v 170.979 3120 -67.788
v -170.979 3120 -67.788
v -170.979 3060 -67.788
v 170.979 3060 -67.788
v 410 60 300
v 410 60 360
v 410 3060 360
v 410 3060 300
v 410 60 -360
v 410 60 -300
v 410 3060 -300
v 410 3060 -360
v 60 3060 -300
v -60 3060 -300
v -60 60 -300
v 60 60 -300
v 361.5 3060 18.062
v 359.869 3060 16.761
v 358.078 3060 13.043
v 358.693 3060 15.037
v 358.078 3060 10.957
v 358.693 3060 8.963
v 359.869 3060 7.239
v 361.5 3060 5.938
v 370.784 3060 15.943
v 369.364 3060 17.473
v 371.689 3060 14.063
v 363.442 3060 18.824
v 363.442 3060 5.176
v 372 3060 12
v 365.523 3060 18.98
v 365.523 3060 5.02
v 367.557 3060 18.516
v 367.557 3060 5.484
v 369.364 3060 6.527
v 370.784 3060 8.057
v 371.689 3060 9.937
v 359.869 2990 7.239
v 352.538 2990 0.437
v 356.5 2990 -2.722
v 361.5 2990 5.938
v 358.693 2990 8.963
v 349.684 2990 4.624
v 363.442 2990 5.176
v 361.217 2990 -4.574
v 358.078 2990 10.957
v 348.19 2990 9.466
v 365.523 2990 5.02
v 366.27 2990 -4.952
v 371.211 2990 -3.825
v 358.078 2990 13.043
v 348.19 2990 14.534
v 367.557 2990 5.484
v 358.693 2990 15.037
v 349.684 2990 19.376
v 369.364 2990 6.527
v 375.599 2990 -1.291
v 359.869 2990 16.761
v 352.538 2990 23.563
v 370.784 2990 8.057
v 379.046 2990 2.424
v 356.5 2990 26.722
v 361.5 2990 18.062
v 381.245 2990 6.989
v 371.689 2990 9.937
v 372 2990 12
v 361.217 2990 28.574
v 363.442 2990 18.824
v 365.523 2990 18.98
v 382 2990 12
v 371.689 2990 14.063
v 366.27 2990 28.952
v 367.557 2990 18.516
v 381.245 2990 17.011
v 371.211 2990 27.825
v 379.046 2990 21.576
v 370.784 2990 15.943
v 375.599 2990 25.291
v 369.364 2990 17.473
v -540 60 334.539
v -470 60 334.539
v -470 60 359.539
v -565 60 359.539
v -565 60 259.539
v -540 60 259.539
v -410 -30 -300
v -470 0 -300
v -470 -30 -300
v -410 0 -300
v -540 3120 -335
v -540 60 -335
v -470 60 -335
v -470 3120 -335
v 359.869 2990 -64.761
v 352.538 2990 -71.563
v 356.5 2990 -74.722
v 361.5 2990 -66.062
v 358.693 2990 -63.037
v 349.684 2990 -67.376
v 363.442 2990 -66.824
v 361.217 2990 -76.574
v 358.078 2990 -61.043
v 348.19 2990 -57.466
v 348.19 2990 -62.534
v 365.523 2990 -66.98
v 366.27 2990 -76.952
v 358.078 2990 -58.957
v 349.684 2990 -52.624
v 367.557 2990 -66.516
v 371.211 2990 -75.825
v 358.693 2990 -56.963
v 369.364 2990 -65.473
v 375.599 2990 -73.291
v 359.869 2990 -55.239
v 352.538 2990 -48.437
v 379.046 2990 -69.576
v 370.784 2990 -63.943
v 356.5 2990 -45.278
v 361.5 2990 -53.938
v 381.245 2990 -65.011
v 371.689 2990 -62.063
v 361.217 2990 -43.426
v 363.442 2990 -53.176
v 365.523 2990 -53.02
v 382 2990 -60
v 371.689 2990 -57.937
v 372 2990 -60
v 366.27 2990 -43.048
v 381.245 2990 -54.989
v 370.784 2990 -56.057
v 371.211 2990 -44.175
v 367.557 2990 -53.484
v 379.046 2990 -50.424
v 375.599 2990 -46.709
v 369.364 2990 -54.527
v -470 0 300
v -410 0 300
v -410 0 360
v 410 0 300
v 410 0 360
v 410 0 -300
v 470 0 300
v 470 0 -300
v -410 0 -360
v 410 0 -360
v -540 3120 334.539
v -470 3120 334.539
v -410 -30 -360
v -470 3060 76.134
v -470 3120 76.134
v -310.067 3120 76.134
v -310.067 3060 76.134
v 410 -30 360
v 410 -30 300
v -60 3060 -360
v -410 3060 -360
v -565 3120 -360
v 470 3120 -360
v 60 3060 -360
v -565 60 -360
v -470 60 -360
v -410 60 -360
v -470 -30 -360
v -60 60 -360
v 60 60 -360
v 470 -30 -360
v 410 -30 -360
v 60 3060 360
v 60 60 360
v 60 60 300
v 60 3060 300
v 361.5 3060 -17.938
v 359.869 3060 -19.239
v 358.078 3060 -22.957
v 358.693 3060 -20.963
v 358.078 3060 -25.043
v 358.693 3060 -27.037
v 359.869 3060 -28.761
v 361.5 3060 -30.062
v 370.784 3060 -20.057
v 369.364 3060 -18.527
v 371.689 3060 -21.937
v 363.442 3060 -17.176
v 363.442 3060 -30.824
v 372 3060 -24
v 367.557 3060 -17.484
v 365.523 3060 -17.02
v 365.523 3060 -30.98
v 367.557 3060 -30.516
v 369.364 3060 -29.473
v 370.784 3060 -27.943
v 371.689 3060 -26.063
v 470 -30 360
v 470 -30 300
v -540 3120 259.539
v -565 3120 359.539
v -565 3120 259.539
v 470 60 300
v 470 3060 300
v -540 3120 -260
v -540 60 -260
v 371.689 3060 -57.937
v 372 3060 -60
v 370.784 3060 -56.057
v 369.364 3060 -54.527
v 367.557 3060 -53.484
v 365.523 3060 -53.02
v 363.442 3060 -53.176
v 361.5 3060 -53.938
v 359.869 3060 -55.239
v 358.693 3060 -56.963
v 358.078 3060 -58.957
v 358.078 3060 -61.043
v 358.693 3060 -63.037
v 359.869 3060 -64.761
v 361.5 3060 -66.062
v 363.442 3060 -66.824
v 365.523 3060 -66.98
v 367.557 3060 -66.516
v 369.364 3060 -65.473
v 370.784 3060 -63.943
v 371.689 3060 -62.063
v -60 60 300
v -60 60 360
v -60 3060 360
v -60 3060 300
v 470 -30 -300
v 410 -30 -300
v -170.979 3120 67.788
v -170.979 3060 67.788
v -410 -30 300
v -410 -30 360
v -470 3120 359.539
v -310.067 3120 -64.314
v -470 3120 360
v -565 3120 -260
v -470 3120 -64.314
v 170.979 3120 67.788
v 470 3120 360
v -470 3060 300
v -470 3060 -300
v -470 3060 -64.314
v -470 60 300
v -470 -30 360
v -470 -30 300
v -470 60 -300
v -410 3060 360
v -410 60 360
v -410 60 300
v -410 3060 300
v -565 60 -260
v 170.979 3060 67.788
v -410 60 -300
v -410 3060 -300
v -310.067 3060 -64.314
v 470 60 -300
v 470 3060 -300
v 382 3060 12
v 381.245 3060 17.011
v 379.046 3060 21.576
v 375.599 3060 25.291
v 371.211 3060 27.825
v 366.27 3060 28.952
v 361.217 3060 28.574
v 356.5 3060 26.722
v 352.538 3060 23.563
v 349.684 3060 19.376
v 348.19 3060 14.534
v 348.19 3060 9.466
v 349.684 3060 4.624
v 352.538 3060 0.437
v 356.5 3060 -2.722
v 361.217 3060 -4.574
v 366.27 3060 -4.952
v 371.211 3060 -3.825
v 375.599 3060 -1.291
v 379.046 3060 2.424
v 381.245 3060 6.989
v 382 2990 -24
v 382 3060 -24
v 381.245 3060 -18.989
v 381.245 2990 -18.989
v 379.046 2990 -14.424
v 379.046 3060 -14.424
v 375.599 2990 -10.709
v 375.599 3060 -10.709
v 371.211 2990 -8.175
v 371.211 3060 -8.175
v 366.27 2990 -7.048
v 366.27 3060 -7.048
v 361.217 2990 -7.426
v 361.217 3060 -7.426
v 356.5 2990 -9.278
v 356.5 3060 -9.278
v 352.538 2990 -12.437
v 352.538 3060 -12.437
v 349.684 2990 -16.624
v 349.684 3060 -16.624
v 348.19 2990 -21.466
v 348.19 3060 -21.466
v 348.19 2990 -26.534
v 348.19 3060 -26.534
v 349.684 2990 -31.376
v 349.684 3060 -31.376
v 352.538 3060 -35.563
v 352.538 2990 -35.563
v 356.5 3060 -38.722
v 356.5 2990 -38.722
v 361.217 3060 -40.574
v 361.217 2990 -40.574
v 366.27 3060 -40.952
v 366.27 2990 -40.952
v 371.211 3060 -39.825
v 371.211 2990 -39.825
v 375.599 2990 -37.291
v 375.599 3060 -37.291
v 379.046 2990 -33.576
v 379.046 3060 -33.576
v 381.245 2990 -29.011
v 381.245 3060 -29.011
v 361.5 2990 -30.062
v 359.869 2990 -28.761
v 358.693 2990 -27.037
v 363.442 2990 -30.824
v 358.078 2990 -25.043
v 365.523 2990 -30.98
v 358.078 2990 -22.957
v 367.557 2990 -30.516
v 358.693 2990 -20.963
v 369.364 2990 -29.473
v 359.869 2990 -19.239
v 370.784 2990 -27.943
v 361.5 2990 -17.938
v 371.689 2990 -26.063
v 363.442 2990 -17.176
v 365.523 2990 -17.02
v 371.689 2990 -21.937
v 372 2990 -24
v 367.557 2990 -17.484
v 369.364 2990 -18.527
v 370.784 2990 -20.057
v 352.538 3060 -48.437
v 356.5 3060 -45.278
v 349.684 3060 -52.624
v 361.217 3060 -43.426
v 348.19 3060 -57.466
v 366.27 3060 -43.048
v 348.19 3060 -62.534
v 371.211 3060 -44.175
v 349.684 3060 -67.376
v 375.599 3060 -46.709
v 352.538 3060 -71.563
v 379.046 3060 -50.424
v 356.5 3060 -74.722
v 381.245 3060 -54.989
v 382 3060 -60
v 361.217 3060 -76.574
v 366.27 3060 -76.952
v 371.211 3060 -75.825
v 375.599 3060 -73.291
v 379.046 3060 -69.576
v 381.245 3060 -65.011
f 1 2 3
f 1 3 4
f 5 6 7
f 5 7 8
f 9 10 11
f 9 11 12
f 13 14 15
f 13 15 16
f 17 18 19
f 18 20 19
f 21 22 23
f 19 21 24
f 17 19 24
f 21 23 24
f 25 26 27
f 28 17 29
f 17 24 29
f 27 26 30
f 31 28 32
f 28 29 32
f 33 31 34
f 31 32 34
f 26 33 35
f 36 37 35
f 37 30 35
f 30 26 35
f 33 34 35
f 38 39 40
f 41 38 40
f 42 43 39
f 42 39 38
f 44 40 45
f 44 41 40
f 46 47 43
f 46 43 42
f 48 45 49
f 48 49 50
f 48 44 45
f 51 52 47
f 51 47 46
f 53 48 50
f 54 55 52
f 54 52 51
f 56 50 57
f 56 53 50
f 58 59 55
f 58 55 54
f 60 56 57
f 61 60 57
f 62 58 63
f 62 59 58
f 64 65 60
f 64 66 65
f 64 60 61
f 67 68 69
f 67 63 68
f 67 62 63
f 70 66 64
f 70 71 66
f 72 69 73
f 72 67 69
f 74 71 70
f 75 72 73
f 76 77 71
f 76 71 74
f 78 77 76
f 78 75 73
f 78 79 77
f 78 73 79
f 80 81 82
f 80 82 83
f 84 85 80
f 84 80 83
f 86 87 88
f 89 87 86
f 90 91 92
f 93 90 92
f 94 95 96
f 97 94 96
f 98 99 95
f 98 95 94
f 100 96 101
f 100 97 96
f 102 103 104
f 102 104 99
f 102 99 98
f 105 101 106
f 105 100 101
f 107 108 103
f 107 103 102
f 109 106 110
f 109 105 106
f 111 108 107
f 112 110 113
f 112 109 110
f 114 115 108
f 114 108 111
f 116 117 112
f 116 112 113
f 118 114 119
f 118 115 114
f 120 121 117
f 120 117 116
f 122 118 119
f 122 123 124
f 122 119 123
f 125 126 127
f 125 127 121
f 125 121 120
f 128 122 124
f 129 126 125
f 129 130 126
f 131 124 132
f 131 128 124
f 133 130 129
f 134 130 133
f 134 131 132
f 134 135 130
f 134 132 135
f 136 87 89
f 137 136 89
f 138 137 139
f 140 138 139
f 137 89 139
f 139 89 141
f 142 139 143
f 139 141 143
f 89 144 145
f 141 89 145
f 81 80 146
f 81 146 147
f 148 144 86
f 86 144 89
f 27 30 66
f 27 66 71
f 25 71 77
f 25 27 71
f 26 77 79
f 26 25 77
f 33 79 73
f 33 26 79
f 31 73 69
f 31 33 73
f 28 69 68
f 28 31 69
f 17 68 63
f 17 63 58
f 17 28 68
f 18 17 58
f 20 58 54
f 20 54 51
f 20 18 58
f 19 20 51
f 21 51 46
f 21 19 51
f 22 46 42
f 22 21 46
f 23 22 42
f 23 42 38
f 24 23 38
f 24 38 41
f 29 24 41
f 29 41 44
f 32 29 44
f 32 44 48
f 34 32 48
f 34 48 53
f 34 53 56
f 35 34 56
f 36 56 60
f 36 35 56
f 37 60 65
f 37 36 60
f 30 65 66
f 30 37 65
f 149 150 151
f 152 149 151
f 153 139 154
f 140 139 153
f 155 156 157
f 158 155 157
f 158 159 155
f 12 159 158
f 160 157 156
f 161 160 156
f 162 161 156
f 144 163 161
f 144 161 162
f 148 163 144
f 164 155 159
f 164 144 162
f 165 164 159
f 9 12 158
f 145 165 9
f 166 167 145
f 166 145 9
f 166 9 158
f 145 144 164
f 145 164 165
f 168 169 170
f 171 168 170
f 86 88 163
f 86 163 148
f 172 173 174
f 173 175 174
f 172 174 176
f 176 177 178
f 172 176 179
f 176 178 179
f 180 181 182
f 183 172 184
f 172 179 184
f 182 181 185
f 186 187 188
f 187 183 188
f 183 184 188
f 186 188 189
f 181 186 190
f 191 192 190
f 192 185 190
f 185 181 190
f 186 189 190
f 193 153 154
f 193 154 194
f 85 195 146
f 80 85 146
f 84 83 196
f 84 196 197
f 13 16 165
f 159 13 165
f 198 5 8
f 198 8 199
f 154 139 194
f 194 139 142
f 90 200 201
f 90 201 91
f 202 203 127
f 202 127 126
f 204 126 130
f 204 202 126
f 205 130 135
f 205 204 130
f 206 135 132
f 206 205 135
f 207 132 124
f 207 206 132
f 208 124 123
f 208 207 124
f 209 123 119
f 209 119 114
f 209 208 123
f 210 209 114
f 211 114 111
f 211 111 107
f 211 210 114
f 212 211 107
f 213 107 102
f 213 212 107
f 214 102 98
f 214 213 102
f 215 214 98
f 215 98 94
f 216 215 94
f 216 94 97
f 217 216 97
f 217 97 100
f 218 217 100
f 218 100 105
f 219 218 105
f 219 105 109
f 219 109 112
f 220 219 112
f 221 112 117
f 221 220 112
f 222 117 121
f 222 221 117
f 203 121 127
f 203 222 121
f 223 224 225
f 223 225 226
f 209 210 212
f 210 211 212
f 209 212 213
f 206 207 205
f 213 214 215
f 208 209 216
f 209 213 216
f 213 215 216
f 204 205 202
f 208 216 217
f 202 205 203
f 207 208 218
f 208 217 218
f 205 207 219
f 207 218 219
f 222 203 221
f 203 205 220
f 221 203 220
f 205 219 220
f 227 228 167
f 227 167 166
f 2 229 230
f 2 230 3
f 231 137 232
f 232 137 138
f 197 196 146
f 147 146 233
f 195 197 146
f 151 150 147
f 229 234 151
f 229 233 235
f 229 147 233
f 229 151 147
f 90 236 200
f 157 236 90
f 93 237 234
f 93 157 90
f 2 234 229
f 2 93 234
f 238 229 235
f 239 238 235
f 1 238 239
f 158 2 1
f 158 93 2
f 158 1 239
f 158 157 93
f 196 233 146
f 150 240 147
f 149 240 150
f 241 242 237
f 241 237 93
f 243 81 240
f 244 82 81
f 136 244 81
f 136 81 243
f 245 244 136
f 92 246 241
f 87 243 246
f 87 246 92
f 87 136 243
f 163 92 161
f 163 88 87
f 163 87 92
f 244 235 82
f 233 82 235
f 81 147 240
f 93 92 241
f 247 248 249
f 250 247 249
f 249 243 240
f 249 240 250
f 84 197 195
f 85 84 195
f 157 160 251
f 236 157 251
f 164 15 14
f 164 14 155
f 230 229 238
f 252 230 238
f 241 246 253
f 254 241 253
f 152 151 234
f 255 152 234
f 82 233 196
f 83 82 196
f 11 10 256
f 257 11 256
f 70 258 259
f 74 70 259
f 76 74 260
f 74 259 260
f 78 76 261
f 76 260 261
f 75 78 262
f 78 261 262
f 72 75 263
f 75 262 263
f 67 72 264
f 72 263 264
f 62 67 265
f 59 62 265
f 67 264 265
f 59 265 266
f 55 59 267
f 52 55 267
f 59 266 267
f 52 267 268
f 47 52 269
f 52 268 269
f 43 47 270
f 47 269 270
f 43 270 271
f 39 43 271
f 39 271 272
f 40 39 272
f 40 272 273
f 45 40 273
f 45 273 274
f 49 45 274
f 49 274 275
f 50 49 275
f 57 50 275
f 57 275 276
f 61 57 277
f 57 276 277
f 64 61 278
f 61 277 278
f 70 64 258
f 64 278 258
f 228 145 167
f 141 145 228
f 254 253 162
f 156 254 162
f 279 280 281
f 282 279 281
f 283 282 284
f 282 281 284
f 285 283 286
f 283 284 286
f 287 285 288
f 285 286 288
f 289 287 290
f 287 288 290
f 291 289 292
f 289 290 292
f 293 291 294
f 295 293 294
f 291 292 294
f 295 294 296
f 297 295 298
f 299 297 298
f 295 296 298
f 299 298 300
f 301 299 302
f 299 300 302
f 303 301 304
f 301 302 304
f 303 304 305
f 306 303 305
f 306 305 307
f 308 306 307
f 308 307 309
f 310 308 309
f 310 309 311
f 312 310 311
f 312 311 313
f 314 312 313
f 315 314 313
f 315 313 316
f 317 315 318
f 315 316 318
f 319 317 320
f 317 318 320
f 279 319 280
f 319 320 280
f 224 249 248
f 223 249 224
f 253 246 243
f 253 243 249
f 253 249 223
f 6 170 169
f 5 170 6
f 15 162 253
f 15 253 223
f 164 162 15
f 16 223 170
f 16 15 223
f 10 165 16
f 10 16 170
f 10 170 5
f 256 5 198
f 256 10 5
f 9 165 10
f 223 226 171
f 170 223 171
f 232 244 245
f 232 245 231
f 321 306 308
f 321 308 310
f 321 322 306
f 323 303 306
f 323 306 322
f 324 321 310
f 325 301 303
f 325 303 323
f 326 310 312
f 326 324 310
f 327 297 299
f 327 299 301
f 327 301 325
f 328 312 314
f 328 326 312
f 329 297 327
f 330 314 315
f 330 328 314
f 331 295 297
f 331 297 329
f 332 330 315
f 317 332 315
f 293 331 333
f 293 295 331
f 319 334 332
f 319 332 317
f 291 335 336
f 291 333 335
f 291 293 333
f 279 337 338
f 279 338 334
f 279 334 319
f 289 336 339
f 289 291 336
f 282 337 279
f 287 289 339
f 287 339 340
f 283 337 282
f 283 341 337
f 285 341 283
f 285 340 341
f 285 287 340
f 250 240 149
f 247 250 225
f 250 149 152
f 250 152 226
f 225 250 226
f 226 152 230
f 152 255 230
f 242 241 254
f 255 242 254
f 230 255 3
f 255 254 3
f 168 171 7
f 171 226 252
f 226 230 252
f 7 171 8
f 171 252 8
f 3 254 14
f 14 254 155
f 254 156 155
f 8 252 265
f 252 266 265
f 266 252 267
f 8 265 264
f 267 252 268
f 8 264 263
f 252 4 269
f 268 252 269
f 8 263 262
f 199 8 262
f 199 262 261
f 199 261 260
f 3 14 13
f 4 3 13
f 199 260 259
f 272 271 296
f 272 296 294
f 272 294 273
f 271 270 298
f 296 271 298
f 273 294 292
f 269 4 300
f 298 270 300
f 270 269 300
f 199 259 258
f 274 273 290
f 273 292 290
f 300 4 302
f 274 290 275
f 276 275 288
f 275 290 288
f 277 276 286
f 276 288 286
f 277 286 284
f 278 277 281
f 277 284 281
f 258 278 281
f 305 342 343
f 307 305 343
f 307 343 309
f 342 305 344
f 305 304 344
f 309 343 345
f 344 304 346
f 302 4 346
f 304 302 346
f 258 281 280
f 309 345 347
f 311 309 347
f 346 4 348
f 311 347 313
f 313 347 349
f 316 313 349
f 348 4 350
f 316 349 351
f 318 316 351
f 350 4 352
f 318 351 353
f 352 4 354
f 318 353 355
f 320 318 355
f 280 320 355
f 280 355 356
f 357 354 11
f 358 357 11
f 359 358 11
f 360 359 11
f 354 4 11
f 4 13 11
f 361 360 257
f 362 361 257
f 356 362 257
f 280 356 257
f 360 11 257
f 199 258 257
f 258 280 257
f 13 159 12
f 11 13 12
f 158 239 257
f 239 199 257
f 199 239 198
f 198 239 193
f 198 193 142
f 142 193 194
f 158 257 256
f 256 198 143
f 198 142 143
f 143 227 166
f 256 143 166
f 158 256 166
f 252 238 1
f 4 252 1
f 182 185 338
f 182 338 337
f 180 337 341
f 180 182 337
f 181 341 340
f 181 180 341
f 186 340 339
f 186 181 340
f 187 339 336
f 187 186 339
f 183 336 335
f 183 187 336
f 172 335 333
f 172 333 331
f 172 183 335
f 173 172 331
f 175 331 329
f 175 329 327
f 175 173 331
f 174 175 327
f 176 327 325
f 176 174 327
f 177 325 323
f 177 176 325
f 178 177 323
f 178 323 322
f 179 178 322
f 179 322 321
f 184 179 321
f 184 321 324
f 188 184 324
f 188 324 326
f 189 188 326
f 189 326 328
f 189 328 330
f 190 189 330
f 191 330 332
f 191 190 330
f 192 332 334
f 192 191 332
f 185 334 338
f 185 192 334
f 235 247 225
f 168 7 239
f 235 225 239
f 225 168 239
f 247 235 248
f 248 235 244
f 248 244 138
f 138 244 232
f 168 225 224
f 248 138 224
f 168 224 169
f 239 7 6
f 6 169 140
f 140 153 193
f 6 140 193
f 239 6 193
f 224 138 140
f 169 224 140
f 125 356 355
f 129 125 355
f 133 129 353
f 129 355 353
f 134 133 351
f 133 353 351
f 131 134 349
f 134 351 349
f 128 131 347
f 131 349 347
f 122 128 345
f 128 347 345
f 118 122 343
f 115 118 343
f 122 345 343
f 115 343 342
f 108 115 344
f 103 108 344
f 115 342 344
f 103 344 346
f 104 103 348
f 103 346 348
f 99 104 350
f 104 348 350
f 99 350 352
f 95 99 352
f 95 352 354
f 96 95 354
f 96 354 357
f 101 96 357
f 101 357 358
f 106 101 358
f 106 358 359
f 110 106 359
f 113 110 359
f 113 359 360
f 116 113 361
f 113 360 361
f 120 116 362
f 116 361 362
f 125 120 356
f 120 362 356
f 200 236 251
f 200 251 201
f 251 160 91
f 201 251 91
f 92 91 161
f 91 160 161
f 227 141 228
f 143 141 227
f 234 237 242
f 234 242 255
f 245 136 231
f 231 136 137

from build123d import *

# Parameters (mm, degrees)
SKETCH1_W            = 940
SKETCH1_H            = 720
BOSS_EXTRUDE1_DEPTH  = 60
SKETCH2_W            = 60
SKETCH2_H            = 60
BOSS_EXTRUDE2_DEPTH  = 3000
SKETCH3_W            = 60
SKETCH3_H            = 60
BOSS_EXTRUDE3_DEPTH  = 30
SKETCH4_W            = 940
SKETCH4_H            = 720
BOSS_EXTRUDE4_DEPTH  = 60
SKETCH5_W            = 120
SKETCH5_H            = 60
BOSS_EXTRUDE5_DEPTH  = 3120
SKETCH6_W            = 341.958021848
SKETCH6_H            = 135.576899716
CUT_EXTRUDE1_DEPTH   = 60
SKETCH8_R            = 17
SKETCH8_R_2          = 7
BOSS_EXTRUDE9_DEPTH  = 70
BOSS_EXTRUDE10_DEPTH = 3060
SKETCH15_W           = 159.933409955
SKETCH15_H           = 140.448340587
CUT_EXTRUDE2_DEPTH   = 60


with BuildPart() as part:
    # Sketch1 → Boss-Extrude1 (new body)
    with BuildSketch(Plane(origin=(0, 0, 0), x_dir=(1, 0, 0), z_dir=(0, 1, 0))):
        Rectangle(SKETCH1_W, SKETCH1_H)
    extrude(amount=BOSS_EXTRUDE1_DEPTH)

    # Sketch2 → Boss-Extrude2 (add)
    with BuildSketch(Plane(origin=(0, 60, 0), x_dir=(1, 0, 0), z_dir=(0, 1, 0))):
        with Locations((-440, 330)):
            Rectangle(SKETCH2_W, SKETCH2_H)
        with Locations((440, 330)):
            Rectangle(SKETCH2_W, SKETCH2_H)
        with Locations((440, -330)):
            Rectangle(SKETCH2_W, SKETCH2_H)
        with Locations((-440, -330)):
            Rectangle(SKETCH2_W, SKETCH2_H)
    extrude(amount=BOSS_EXTRUDE2_DEPTH)

    # Sketch3 → Boss-Extrude3 (add)
    with BuildSketch(Plane.XZ):
        with Locations((-440, 330)):
            Rectangle(SKETCH3_W, SKETCH3_H)
        with Locations((-440, -330)):
            Rectangle(SKETCH3_W, SKETCH3_H)
        with Locations((440, 330)):
            Rectangle(SKETCH3_W, SKETCH3_H)
        with Locations((440, -330)):
            Rectangle(SKETCH3_W, SKETCH3_H)
    extrude(amount=BOSS_EXTRUDE3_DEPTH)

    # Sketch4 → Boss-Extrude4 (add)
    with BuildSketch(Plane(origin=(0, 3060, 0), x_dir=(1, 0, 0), z_dir=(0, 1, 0))):
        Rectangle(SKETCH4_W, SKETCH4_H)
    extrude(amount=BOSS_EXTRUDE4_DEPTH)

    # Sketch5 → Boss-Extrude5 (add)
    with BuildSketch(Plane(origin=(0, 0, 0), x_dir=(1, 0, 0), z_dir=(0, 1, 0))):
        with Locations((0, 330)):
            Rectangle(SKETCH5_W, SKETCH5_H)
        with Locations((0, -330)):
            Rectangle(SKETCH5_W, SKETCH5_H)
    extrude(amount=BOSS_EXTRUDE5_DEPTH)

    # Sketch6 → Cut-Extrude1 (cut)
    with BuildSketch(Plane(origin=(0, 3120, 0), x_dir=(1, 0, 0), z_dir=(0, 1, 0))):
        Rectangle(SKETCH6_W, SKETCH6_H)
    extrude(amount=-CUT_EXTRUDE1_DEPTH, mode=Mode.SUBTRACT)

    # Sketch8 → Boss-Extrude9 (add)
    with BuildSketch(Plane.XZ.offset(-3060)):
        with Locations((365, 12)):
            Circle(SKETCH8_R)
        with Locations((365, 12)):
            Circle(SKETCH8_R_2, mode=Mode.SUBTRACT)
        with Locations((365, -60)):
            Circle(SKETCH8_R)
        with Locations((365, -60)):
            Circle(SKETCH8_R_2, mode=Mode.SUBTRACT)
        with Locations((365, -24)):
            Circle(SKETCH8_R)
        with Locations((365, -24)):
            Circle(SKETCH8_R_2, mode=Mode.SUBTRACT)
    extrude(amount=BOSS_EXTRUDE9_DEPTH)

    # Sketch13 → Boss-Extrude10 (add)
    with BuildSketch(Plane(origin=(0, 3120, 0), x_dir=(1, 0, 0), z_dir=(0, 1, 0))):
        Polygon((-435.683556983, 360), (-565, 360), (-565, 260), (-540, 260), (-540, 335), (-435.683556983, 335), align=None)
        Polygon((-435.683556983, -359.538961542), (-565, -359.538961542), (-565, -259.538961542), (-540, -259.538961542), (-540, -334.538961542), (-435.683556983, -334.538961542), align=None)
    extrude(amount=-BOSS_EXTRUDE10_DEPTH)

    # Sketch15 → Cut-Extrude2 (cut)
    with BuildSketch(Plane(origin=(0, 3120, 0), x_dir=(1, 0, 0), z_dir=(0, 1, 0))):
        with Locations((-390.033295023, -5.90994298)):
            Rectangle(SKETCH15_W, SKETCH15_H)
    extrude(amount=-CUT_EXTRUDE2_DEPTH, mode=Mode.SUBTRACT)


solid = part.part
